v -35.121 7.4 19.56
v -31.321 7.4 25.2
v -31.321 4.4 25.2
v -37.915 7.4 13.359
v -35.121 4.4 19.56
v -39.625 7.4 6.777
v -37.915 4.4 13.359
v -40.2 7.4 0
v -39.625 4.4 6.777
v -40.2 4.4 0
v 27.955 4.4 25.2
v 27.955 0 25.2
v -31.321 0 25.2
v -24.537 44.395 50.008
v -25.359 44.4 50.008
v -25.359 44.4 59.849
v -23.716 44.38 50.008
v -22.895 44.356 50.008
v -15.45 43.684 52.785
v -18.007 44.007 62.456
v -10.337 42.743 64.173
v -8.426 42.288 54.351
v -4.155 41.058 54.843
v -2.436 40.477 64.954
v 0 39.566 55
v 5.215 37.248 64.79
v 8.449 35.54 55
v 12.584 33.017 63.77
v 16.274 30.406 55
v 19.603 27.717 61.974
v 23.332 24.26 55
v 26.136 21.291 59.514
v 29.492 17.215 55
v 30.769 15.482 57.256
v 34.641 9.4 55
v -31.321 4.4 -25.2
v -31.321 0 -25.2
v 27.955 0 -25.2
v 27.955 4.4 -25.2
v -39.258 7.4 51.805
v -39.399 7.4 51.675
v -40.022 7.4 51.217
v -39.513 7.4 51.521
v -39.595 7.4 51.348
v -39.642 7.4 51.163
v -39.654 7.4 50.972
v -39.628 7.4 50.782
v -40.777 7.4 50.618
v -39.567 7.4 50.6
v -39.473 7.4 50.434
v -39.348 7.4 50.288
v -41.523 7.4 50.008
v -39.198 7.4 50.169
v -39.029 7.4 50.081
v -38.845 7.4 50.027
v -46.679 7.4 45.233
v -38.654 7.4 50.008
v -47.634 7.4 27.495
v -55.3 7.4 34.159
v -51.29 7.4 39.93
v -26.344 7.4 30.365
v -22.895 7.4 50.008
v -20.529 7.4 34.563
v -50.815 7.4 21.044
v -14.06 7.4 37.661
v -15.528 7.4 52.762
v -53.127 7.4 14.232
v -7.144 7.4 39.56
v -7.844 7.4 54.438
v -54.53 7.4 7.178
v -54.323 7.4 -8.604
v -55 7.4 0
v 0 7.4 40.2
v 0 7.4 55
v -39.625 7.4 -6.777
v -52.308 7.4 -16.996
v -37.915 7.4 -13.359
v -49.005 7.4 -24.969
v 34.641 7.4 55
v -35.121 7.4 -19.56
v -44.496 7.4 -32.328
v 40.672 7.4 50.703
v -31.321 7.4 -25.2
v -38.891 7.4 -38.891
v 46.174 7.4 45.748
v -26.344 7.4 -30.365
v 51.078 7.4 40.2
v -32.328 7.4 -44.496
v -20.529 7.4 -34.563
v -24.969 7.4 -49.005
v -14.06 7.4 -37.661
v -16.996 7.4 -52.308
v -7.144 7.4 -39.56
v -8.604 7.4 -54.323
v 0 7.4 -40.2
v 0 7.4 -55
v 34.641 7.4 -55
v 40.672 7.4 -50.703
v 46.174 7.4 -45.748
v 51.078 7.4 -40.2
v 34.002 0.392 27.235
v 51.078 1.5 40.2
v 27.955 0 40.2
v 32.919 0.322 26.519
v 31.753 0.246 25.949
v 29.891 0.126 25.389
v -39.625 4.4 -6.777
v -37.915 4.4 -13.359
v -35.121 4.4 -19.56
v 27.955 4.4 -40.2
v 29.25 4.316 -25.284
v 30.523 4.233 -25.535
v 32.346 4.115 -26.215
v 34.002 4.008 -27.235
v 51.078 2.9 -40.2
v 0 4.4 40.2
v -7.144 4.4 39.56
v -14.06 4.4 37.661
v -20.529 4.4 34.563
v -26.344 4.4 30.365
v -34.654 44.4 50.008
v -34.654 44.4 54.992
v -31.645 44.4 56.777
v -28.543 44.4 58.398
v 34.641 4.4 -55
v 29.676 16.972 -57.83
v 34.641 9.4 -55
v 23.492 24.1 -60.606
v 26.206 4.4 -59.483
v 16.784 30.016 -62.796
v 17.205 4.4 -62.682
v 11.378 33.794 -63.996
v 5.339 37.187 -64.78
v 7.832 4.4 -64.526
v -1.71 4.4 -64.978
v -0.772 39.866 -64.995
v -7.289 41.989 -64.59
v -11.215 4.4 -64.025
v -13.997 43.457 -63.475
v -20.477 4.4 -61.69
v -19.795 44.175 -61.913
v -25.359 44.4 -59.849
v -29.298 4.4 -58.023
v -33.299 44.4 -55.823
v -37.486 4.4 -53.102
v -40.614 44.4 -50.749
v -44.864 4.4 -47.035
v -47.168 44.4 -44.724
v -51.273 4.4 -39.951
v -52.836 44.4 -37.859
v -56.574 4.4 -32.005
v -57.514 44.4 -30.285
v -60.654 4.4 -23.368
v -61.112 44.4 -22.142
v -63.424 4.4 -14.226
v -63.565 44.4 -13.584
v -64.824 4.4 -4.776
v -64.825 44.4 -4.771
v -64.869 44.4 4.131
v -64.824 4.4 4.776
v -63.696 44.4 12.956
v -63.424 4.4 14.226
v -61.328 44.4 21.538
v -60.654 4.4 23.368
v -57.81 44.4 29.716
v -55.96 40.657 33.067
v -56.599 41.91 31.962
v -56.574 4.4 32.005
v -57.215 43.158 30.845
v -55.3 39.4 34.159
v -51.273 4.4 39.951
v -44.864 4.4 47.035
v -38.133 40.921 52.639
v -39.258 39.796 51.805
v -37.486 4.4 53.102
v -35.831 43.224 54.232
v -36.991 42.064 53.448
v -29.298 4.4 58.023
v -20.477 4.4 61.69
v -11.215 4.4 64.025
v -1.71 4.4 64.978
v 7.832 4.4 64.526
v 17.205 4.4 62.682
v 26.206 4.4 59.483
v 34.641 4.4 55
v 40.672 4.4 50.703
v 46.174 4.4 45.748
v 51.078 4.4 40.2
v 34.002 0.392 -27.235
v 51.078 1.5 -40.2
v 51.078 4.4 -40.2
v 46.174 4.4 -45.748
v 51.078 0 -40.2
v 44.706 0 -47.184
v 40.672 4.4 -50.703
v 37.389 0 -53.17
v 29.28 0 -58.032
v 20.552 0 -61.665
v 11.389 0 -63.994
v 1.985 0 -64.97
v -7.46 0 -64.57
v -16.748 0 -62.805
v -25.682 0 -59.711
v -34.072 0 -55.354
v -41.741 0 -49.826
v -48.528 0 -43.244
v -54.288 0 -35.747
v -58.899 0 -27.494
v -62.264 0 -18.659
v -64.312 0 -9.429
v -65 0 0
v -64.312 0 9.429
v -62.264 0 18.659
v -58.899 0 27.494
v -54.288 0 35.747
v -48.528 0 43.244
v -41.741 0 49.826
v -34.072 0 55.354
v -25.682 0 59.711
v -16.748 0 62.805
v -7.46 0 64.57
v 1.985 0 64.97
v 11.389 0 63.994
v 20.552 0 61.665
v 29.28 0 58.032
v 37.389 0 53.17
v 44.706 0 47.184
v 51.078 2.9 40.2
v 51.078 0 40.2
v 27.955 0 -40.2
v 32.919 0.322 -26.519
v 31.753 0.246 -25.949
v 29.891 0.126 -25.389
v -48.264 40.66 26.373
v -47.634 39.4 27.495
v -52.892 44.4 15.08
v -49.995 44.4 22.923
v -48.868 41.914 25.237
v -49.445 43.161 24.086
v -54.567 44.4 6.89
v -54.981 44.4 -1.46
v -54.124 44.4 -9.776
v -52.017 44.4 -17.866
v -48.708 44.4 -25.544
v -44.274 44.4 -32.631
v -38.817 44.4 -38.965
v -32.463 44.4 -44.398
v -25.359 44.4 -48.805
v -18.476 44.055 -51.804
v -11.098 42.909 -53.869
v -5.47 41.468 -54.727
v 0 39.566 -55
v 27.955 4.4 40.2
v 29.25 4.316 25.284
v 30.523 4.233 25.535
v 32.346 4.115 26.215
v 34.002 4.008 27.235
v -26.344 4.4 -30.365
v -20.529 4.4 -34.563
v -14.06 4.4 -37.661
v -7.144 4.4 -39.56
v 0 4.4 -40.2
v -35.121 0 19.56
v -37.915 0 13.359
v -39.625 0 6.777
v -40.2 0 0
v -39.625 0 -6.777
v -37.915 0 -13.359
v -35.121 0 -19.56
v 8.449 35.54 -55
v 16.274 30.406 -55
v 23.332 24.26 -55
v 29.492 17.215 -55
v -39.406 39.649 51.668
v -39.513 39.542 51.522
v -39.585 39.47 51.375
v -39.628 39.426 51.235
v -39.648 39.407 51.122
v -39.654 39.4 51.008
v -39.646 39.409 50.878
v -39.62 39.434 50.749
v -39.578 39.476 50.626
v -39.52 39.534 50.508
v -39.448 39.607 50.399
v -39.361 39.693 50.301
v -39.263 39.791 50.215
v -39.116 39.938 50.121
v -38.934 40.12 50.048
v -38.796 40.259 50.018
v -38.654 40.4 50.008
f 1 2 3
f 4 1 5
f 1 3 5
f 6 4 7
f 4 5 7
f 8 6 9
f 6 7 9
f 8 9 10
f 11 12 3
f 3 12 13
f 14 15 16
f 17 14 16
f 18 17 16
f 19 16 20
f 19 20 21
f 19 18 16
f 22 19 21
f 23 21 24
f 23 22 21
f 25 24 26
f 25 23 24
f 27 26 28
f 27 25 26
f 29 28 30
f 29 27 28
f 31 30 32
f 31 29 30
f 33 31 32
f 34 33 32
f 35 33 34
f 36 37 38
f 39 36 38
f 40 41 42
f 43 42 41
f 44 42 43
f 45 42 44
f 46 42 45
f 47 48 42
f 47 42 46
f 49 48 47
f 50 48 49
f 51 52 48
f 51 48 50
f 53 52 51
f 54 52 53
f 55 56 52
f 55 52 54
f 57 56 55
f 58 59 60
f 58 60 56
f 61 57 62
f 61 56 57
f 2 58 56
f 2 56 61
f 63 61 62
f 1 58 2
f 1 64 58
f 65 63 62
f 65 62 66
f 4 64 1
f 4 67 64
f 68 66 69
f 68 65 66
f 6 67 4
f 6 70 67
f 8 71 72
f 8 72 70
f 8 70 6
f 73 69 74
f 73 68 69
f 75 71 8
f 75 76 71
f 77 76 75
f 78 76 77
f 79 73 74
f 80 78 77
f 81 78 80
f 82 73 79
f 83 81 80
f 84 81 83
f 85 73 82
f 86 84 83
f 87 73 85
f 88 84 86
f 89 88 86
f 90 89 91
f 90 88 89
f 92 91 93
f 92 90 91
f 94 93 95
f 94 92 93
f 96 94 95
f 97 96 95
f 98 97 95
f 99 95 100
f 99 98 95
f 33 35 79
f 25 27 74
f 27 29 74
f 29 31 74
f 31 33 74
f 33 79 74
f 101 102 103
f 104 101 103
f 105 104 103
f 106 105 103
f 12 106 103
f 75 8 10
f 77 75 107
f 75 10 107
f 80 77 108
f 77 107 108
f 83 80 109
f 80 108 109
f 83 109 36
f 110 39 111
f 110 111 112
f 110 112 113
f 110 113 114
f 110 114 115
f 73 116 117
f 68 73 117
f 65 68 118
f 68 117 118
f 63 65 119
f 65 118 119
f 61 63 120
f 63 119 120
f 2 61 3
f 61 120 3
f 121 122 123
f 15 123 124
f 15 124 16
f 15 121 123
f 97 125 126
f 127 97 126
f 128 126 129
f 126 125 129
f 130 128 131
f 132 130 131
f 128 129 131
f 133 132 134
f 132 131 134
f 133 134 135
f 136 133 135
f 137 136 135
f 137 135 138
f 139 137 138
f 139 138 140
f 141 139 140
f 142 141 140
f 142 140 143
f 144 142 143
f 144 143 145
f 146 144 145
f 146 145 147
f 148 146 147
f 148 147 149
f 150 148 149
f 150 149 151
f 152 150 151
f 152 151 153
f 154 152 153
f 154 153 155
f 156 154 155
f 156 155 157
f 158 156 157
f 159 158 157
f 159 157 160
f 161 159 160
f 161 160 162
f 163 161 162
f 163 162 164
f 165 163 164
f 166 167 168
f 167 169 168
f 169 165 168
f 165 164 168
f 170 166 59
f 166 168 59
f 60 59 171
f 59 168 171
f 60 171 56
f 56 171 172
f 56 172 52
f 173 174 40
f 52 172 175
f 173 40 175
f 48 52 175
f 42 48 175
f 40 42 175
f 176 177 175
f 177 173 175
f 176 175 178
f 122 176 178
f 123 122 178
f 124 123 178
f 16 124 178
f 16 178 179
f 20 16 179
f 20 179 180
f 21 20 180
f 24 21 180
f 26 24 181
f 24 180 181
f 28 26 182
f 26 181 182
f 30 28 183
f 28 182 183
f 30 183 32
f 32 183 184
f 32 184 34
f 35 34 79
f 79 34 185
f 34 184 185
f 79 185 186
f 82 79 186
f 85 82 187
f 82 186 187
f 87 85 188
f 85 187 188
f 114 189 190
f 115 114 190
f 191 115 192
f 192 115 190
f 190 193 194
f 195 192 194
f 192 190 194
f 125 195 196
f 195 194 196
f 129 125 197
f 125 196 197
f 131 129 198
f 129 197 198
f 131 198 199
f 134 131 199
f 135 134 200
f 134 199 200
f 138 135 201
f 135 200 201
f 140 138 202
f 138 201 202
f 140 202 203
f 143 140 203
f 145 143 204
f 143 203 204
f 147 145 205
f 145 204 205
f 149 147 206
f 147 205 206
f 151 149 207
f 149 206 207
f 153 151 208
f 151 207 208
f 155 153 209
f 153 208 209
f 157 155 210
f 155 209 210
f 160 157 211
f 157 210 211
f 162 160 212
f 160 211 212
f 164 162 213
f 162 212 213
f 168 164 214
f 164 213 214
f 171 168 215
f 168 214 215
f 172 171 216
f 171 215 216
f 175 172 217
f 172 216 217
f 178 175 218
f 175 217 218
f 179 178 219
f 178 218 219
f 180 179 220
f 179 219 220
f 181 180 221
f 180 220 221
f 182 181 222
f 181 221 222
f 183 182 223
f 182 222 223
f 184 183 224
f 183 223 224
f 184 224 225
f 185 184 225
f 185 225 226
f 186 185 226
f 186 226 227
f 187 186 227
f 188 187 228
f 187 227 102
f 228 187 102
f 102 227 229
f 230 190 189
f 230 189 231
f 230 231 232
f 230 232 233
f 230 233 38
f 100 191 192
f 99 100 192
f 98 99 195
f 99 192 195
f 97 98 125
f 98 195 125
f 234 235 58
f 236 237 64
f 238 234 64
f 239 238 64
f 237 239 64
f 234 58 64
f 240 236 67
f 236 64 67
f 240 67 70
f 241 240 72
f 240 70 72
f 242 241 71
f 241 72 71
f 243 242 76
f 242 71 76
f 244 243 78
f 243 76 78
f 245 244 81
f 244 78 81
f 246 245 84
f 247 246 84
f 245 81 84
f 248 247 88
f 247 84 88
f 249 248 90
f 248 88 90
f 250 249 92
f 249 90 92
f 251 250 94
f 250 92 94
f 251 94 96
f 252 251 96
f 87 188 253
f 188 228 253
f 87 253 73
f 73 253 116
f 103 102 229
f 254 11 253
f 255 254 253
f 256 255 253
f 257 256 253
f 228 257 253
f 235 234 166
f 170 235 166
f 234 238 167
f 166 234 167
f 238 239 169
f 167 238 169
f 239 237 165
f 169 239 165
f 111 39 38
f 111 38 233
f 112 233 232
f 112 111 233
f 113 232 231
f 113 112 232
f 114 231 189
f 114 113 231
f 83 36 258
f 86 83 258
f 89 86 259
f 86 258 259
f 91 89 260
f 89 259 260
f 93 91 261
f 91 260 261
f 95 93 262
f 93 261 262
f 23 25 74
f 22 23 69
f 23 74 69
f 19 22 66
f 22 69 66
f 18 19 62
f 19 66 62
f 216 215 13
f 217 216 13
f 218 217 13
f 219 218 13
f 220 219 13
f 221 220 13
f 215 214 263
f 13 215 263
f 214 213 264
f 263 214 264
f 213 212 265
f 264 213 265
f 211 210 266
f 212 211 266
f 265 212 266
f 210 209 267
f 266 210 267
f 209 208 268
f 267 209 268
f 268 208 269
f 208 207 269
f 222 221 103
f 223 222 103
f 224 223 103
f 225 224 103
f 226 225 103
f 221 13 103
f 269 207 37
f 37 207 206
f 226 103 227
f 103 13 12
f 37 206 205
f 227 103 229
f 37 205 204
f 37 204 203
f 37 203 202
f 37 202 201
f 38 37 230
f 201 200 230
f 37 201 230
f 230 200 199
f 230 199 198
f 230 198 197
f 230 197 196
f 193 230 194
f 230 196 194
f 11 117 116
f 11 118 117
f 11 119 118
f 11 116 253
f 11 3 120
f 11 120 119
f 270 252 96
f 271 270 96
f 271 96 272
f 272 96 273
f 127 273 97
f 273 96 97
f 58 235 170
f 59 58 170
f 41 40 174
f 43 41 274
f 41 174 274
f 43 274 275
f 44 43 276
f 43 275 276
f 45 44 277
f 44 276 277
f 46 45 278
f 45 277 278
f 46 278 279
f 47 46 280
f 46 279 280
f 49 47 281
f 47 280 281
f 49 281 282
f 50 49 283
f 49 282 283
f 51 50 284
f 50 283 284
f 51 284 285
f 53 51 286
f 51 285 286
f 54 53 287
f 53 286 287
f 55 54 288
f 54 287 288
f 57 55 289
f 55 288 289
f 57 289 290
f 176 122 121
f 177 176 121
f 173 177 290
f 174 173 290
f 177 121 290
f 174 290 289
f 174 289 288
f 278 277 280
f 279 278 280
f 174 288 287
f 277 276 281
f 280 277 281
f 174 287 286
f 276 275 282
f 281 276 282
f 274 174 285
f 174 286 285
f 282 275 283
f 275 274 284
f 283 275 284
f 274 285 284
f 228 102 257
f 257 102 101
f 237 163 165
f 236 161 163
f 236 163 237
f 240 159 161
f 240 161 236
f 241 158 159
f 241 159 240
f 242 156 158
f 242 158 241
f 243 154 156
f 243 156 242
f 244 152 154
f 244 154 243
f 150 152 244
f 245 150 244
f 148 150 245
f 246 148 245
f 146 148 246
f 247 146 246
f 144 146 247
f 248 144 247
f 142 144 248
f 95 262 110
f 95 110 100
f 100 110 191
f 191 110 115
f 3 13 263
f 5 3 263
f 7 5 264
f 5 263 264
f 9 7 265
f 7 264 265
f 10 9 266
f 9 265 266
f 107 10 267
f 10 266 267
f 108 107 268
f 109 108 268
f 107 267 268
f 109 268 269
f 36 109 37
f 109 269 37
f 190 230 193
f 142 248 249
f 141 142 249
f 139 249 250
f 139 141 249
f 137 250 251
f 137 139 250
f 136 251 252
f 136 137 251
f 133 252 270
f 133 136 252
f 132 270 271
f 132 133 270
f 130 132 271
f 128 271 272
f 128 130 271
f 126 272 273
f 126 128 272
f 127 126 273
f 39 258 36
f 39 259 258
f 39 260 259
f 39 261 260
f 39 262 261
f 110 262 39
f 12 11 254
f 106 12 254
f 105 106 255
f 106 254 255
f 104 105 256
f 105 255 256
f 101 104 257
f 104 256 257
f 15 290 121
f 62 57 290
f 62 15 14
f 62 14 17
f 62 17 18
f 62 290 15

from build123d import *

# Parameters (mm, degrees)
BOSS_EXTRUDE1_DEPTH            = 4.4
BOSS_EXTRUDE2_START            = 4.4
BOSS_EXTRUDE2_DEPTH            = 40
BOSS_EXTRUDE3_START            = 4.4
BOSS_EXTRUDE3_DEPTH            = 3
CUT_EXTRUDE1_START             = -37
CUT_EXTRUDE1_DEPTH             = 37
CUT_EXTRUDE2_DEPTH             = 120.718001988
CUT_EXTRUDE2_DEPTH_BACK        = 120.718001988
FILLET1_R                      = 10
CUT_EXTRUDE3_REACH             = 121.718
CUT_EXTRUDE3_DIRECTION_2_REACH = 121.718
FILLET2_R                      = 1
CHAMFER1_SIZE                  = 5
CUT_EXTRUDE4_REACH             = 141.367
CUT_EXTRUDE4_END_RADIUS        = 65


with BuildPart() as part:
    # Sketch1 → Boss-Extrude1 (new body)
    with BuildSketch(Plane(origin=(0, 0, 0), x_dir=(1, 0, 0), z_dir=(0, 1, 0))):
        with BuildLine():
            Line((-31.320919527, 25.2), (31.320919527, 25.2))
            Line((31.320919527, 25.2), (51.0779796, 40.2))
            ThreePointArc((51.0779796, 40.2), (-65, 0), (51.0779796, -40.2))
            Line((51.0779796, -40.2), (31.320919527, -25.2))
            Line((31.320919527, -25.2), (-31.320919527, -25.2))
            ThreePointArc((-31.320919527, -25.2), (-40.2, 0), (-31.320919527, 25.2))
        make_face()
    extrude(amount=BOSS_EXTRUDE1_DEPTH)

    # Sketch1<3> → Boss-Extrude2 (add)
    with BuildSketch(Plane(origin=(0, 0, 0), x_dir=(1, 0, 0), z_dir=(0, 1, 0)).offset(BOSS_EXTRUDE2_START)):
        with BuildLine():
            ThreePointArc((0, -55), (-55, 0), (0, 55))
            Line((0, 55), (34.641016151, 55))
            ThreePointArc((34.641016151, 55), (-65, 0), (34.641016151, -55))
            Line((34.641016151, -55), (0, -55))
        make_face()
    extrude(amount=BOSS_EXTRUDE2_DEPTH)

    # Sketch1<4> → Boss-Extrude3 (add)
    with BuildSketch(Plane(origin=(0, 0, 0), x_dir=(1, 0, 0), z_dir=(0, 1, 0)).offset(BOSS_EXTRUDE3_START)):
        with BuildLine():
            ThreePointArc((-40.2, 0), (-37.915306704, 13.359248389), (-31.320919527, 25.2))
            ThreePointArc((-31.320919527, 25.2), (-17.363755354, 36.256585609), (0, 40.2))
            Line((0, 40.2), (37.536115942, 40.2))
            ThreePointArc((37.536115942, 40.2), (20.174241002, 51.166395222), (0, 55))
            ThreePointArc((0, 55), (-38.890872965, 38.890872965), (-55, 0))
            Line((-55, 0), (-40.2, 0))
        make_face()
        with BuildLine():
            ThreePointArc((-31.320919527, -25.2), (-37.915306704, -13.359248389), (-40.2, 0))
            Line((-40.2, 0), (-55, 0))
            ThreePointArc((-55, 0), (-38.890872965, -38.890872965), (0, -55))
            ThreePointArc((0, -55), (20.174241002, -51.166395222), (37.536115942, -40.2))
            Line((37.536115942, -40.2), (0, -40.2))
            ThreePointArc((0, -40.2), (-17.363755354, -36.256585609), (-31.320919527, -25.2))
        make_face()
        with BuildLine():
            ThreePointArc((37.536115942, -40.2), (20.174241002, -51.166395222), (0, -55))
            Line((0, -55), (34.641016151, -55))
            ThreePointArc((34.641016151, -55), (43.493638134, -48.304279747), (51.0779796, -40.2))
            Line((51.0779796, -40.2), (37.536115942, -40.2))
        make_face()
        with BuildLine():
            ThreePointArc((0, 55), (20.174241002, 51.166395222), (37.536115942, 40.2))
            Line((37.536115942, 40.2), (51.0779796, 40.2))
            ThreePointArc((51.0779796, 40.2), (43.493638134, 48.304279747), (34.641016151, 55))
            Line((34.641016151, 55), (0, 55))
        make_face()
    extrude(amount=BOSS_EXTRUDE3_DEPTH)

    # Sketch2 → Cut-Extrude1 (cut)
    with BuildSketch(Plane(origin=(0, 44.4, 0), x_dir=(1, 0, 0), z_dir=(0, 1, 0)).offset(CUT_EXTRUDE1_START)):
        with BuildLine():
            Line((-47.634201136, -27.495142883), (-55.300459871, -34.15931993))
            ThreePointArc((-55.300459871, -34.15931993), (-49.056122714, -42.643836884), (-41.523220262, -50.008221115))
            Line((-41.523220262, -50.008221115), (-33.856961527, -43.344044068))
            ThreePointArc((-33.856961527, -43.344044068), (-41.509026912, -36.083246594), (-47.634201136, -27.495142883))
        make_face()
        with BuildLine():
            Line((-33.856961527, -43.344044068), (-41.523220262, -50.008221115))
            Line((-41.523220262, -50.008221115), (-22.894930026, -50.008221115))
            ThreePointArc((-22.894930026, -50.008221115), (-28.570913752, -46.996839121), (-33.856961527, -43.344044068))
        make_face()
    extrude(amount=CUT_EXTRUDE1_DEPTH, mode=Mode.SUBTRACT)

    # Sketch3 → Cut-Extrude2 (cut, two sides: drawn at the far end of the back side and taken through both)
    with BuildSketch(Plane.XY.offset(-25.2).offset(-CUT_EXTRUDE2_DEPTH_BACK)):
        with BuildLine():
            Line((34.641016151, 44.4), (-25.358983849, 44.4))
            ThreePointArc((-25.358983849, 44.4), (9.372126125, 35.01047424), (34.641016151, 9.4))
            Line((34.641016151, 9.4), (34.641016151, 44.4))
        make_face()
    extrude(amount=CUT_EXTRUDE2_DEPTH + CUT_EXTRUDE2_DEPTH_BACK, mode=Mode.SUBTRACT)

    # Fillet1
    fillet1_edges = [part.edges().sort_by_distance(p)[0] for p in [
        (31.320919527, 2.2, -25.2),
        (31.320919527, 2.2, 25.2),
    ]]
    fillet(fillet1_edges, radius=FILLET1_R)

    # Cut-Extrude3: up to this face of the body (flat: up to its plane)
    cut_extrude3_end = Plane(part.part.faces().sort_by_distance((25.5389898, 5.9, -40.2))[0])
    # Sketch4 → Cut-Extrude3 (cut, up to the picked face)
    with BuildSketch(Plane.XY.offset(-25.2), mode=Mode.PRIVATE) as cut_extrude3_sk1:
        Polygon((51.0779796, 4.4), (27.954908691, 4.4), (51.0779796, 2.9), align=None)
    cut_extrude3_tool1 = split(extrude(cut_extrude3_sk1.sketch, amount=-CUT_EXTRUDE3_REACH, mode=Mode.PRIVATE), bisect_by=cut_extrude3_end, keep=Keep.BOTH, mode=Mode.PRIVATE)
    # Sketch4 → Cut-Extrude3 (cut, up to the picked face)
    with BuildSketch(Plane.XY.offset(-25.2), mode=Mode.PRIVATE) as cut_extrude3_sk2:
        Polygon((51.0779796, 0), (51.0779796, 1.5), (27.954908691, 0), align=None)
    cut_extrude3_tool2 = split(extrude(cut_extrude3_sk2.sketch, amount=-CUT_EXTRUDE3_REACH, mode=Mode.PRIVATE), bisect_by=cut_extrude3_end, keep=Keep.BOTH, mode=Mode.PRIVATE)
    add(cut_extrude3_tool1.solids().sort_by(Axis((43.370289, 3.9, -25.2), (0, 0, -1)))[0], mode=Mode.SUBTRACT)
    add(cut_extrude3_tool2.solids().sort_by(Axis((43.370289, 0.5, -25.2), (0, 0, -1)))[0], mode=Mode.SUBTRACT)

    # Cut-Extrude3 direction 2: up to this face of the body (flat: up to its plane)
    cut_extrude3_direction_2_end = Plane(part.part.faces().sort_by_distance((25.5389898, 5.9, 40.2))[0])
    # Sketch4 → Cut-Extrude3 direction 2 (cut, up to the picked face)
    with BuildSketch(Plane.XY.offset(-25.2), mode=Mode.PRIVATE) as cut_extrude3_direction_2_sk1:
        Polygon((51.0779796, 4.4), (27.954908691, 4.4), (51.0779796, 2.9), align=None)
    cut_extrude3_direction_2_tool1 = split(extrude(cut_extrude3_direction_2_sk1.sketch, amount=CUT_EXTRUDE3_DIRECTION_2_REACH, mode=Mode.PRIVATE), bisect_by=cut_extrude3_direction_2_end, keep=Keep.BOTH, mode=Mode.PRIVATE)
    # Sketch4 → Cut-Extrude3 direction 2 (cut, up to the picked face)
    with BuildSketch(Plane.XY.offset(-25.2), mode=Mode.PRIVATE) as cut_extrude3_direction_2_sk2:
        Polygon((51.0779796, 0), (51.0779796, 1.5), (27.954908691, 0), align=None)
    cut_extrude3_direction_2_tool2 = split(extrude(cut_extrude3_direction_2_sk2.sketch, amount=CUT_EXTRUDE3_DIRECTION_2_REACH, mode=Mode.PRIVATE), bisect_by=cut_extrude3_direction_2_end, keep=Keep.BOTH, mode=Mode.PRIVATE)
    add(cut_extrude3_direction_2_tool1.solids().sort_by(Axis((43.370289, 3.9, -25.2), (0, 0, 1)))[0], mode=Mode.SUBTRACT)
    add(cut_extrude3_direction_2_tool2.solids().sort_by(Axis((43.370289, 0.5, -25.2), (0, 0, 1)))[0], mode=Mode.SUBTRACT)

    # Fillet2
    fillet2_edges = [part.edges().sort_by_distance(p)[0] for p in [
        (-41.523220262, 25.9, 50.008221115),
    ]]
    fillet(fillet2_edges, radius=FILLET2_R)

    # Chamfer1
    chamfer1_edges = [part.edges().sort_by_distance(p)[0] for p in [
        (-51.467330503, 44.4, 30.827231407),
    ]]
    chamfer(chamfer1_edges, length=CHAMFER1_SIZE)

    # Cut-Extrude4: up to this cylinder (the profile starts inside it)
    cut_extrude4_end = Plane(origin=(0, 42.733333, 0), z_dir=(0, -1, 0)) * Cylinder(CUT_EXTRUDE4_END_RADIUS, 413.734, mode=Mode.PRIVATE)
    # Sketch5 → Cut-Extrude4 (cut, up to the surface)
    with BuildSketch(Plane(origin=(0, 0, 50.008221115), x_dir=(-1, 0, 0), z_dir=(0, 0, -1)), mode=Mode.PRIVATE) as cut_extrude4_sk1:
        Polygon((34.654383693, 44.4), (39.654383693, 39.4), (39.654383693, 44.4), align=None)
    cut_extrude4_tool1 = extrude(cut_extrude4_sk1.sketch, amount=-CUT_EXTRUDE4_REACH, mode=Mode.PRIVATE) & cut_extrude4_end
    add(cut_extrude4_tool1.solids().sort_by_distance((-37.987717, 42.733333, 50.008221))[0], mode=Mode.SUBTRACT)


solid = part.part
